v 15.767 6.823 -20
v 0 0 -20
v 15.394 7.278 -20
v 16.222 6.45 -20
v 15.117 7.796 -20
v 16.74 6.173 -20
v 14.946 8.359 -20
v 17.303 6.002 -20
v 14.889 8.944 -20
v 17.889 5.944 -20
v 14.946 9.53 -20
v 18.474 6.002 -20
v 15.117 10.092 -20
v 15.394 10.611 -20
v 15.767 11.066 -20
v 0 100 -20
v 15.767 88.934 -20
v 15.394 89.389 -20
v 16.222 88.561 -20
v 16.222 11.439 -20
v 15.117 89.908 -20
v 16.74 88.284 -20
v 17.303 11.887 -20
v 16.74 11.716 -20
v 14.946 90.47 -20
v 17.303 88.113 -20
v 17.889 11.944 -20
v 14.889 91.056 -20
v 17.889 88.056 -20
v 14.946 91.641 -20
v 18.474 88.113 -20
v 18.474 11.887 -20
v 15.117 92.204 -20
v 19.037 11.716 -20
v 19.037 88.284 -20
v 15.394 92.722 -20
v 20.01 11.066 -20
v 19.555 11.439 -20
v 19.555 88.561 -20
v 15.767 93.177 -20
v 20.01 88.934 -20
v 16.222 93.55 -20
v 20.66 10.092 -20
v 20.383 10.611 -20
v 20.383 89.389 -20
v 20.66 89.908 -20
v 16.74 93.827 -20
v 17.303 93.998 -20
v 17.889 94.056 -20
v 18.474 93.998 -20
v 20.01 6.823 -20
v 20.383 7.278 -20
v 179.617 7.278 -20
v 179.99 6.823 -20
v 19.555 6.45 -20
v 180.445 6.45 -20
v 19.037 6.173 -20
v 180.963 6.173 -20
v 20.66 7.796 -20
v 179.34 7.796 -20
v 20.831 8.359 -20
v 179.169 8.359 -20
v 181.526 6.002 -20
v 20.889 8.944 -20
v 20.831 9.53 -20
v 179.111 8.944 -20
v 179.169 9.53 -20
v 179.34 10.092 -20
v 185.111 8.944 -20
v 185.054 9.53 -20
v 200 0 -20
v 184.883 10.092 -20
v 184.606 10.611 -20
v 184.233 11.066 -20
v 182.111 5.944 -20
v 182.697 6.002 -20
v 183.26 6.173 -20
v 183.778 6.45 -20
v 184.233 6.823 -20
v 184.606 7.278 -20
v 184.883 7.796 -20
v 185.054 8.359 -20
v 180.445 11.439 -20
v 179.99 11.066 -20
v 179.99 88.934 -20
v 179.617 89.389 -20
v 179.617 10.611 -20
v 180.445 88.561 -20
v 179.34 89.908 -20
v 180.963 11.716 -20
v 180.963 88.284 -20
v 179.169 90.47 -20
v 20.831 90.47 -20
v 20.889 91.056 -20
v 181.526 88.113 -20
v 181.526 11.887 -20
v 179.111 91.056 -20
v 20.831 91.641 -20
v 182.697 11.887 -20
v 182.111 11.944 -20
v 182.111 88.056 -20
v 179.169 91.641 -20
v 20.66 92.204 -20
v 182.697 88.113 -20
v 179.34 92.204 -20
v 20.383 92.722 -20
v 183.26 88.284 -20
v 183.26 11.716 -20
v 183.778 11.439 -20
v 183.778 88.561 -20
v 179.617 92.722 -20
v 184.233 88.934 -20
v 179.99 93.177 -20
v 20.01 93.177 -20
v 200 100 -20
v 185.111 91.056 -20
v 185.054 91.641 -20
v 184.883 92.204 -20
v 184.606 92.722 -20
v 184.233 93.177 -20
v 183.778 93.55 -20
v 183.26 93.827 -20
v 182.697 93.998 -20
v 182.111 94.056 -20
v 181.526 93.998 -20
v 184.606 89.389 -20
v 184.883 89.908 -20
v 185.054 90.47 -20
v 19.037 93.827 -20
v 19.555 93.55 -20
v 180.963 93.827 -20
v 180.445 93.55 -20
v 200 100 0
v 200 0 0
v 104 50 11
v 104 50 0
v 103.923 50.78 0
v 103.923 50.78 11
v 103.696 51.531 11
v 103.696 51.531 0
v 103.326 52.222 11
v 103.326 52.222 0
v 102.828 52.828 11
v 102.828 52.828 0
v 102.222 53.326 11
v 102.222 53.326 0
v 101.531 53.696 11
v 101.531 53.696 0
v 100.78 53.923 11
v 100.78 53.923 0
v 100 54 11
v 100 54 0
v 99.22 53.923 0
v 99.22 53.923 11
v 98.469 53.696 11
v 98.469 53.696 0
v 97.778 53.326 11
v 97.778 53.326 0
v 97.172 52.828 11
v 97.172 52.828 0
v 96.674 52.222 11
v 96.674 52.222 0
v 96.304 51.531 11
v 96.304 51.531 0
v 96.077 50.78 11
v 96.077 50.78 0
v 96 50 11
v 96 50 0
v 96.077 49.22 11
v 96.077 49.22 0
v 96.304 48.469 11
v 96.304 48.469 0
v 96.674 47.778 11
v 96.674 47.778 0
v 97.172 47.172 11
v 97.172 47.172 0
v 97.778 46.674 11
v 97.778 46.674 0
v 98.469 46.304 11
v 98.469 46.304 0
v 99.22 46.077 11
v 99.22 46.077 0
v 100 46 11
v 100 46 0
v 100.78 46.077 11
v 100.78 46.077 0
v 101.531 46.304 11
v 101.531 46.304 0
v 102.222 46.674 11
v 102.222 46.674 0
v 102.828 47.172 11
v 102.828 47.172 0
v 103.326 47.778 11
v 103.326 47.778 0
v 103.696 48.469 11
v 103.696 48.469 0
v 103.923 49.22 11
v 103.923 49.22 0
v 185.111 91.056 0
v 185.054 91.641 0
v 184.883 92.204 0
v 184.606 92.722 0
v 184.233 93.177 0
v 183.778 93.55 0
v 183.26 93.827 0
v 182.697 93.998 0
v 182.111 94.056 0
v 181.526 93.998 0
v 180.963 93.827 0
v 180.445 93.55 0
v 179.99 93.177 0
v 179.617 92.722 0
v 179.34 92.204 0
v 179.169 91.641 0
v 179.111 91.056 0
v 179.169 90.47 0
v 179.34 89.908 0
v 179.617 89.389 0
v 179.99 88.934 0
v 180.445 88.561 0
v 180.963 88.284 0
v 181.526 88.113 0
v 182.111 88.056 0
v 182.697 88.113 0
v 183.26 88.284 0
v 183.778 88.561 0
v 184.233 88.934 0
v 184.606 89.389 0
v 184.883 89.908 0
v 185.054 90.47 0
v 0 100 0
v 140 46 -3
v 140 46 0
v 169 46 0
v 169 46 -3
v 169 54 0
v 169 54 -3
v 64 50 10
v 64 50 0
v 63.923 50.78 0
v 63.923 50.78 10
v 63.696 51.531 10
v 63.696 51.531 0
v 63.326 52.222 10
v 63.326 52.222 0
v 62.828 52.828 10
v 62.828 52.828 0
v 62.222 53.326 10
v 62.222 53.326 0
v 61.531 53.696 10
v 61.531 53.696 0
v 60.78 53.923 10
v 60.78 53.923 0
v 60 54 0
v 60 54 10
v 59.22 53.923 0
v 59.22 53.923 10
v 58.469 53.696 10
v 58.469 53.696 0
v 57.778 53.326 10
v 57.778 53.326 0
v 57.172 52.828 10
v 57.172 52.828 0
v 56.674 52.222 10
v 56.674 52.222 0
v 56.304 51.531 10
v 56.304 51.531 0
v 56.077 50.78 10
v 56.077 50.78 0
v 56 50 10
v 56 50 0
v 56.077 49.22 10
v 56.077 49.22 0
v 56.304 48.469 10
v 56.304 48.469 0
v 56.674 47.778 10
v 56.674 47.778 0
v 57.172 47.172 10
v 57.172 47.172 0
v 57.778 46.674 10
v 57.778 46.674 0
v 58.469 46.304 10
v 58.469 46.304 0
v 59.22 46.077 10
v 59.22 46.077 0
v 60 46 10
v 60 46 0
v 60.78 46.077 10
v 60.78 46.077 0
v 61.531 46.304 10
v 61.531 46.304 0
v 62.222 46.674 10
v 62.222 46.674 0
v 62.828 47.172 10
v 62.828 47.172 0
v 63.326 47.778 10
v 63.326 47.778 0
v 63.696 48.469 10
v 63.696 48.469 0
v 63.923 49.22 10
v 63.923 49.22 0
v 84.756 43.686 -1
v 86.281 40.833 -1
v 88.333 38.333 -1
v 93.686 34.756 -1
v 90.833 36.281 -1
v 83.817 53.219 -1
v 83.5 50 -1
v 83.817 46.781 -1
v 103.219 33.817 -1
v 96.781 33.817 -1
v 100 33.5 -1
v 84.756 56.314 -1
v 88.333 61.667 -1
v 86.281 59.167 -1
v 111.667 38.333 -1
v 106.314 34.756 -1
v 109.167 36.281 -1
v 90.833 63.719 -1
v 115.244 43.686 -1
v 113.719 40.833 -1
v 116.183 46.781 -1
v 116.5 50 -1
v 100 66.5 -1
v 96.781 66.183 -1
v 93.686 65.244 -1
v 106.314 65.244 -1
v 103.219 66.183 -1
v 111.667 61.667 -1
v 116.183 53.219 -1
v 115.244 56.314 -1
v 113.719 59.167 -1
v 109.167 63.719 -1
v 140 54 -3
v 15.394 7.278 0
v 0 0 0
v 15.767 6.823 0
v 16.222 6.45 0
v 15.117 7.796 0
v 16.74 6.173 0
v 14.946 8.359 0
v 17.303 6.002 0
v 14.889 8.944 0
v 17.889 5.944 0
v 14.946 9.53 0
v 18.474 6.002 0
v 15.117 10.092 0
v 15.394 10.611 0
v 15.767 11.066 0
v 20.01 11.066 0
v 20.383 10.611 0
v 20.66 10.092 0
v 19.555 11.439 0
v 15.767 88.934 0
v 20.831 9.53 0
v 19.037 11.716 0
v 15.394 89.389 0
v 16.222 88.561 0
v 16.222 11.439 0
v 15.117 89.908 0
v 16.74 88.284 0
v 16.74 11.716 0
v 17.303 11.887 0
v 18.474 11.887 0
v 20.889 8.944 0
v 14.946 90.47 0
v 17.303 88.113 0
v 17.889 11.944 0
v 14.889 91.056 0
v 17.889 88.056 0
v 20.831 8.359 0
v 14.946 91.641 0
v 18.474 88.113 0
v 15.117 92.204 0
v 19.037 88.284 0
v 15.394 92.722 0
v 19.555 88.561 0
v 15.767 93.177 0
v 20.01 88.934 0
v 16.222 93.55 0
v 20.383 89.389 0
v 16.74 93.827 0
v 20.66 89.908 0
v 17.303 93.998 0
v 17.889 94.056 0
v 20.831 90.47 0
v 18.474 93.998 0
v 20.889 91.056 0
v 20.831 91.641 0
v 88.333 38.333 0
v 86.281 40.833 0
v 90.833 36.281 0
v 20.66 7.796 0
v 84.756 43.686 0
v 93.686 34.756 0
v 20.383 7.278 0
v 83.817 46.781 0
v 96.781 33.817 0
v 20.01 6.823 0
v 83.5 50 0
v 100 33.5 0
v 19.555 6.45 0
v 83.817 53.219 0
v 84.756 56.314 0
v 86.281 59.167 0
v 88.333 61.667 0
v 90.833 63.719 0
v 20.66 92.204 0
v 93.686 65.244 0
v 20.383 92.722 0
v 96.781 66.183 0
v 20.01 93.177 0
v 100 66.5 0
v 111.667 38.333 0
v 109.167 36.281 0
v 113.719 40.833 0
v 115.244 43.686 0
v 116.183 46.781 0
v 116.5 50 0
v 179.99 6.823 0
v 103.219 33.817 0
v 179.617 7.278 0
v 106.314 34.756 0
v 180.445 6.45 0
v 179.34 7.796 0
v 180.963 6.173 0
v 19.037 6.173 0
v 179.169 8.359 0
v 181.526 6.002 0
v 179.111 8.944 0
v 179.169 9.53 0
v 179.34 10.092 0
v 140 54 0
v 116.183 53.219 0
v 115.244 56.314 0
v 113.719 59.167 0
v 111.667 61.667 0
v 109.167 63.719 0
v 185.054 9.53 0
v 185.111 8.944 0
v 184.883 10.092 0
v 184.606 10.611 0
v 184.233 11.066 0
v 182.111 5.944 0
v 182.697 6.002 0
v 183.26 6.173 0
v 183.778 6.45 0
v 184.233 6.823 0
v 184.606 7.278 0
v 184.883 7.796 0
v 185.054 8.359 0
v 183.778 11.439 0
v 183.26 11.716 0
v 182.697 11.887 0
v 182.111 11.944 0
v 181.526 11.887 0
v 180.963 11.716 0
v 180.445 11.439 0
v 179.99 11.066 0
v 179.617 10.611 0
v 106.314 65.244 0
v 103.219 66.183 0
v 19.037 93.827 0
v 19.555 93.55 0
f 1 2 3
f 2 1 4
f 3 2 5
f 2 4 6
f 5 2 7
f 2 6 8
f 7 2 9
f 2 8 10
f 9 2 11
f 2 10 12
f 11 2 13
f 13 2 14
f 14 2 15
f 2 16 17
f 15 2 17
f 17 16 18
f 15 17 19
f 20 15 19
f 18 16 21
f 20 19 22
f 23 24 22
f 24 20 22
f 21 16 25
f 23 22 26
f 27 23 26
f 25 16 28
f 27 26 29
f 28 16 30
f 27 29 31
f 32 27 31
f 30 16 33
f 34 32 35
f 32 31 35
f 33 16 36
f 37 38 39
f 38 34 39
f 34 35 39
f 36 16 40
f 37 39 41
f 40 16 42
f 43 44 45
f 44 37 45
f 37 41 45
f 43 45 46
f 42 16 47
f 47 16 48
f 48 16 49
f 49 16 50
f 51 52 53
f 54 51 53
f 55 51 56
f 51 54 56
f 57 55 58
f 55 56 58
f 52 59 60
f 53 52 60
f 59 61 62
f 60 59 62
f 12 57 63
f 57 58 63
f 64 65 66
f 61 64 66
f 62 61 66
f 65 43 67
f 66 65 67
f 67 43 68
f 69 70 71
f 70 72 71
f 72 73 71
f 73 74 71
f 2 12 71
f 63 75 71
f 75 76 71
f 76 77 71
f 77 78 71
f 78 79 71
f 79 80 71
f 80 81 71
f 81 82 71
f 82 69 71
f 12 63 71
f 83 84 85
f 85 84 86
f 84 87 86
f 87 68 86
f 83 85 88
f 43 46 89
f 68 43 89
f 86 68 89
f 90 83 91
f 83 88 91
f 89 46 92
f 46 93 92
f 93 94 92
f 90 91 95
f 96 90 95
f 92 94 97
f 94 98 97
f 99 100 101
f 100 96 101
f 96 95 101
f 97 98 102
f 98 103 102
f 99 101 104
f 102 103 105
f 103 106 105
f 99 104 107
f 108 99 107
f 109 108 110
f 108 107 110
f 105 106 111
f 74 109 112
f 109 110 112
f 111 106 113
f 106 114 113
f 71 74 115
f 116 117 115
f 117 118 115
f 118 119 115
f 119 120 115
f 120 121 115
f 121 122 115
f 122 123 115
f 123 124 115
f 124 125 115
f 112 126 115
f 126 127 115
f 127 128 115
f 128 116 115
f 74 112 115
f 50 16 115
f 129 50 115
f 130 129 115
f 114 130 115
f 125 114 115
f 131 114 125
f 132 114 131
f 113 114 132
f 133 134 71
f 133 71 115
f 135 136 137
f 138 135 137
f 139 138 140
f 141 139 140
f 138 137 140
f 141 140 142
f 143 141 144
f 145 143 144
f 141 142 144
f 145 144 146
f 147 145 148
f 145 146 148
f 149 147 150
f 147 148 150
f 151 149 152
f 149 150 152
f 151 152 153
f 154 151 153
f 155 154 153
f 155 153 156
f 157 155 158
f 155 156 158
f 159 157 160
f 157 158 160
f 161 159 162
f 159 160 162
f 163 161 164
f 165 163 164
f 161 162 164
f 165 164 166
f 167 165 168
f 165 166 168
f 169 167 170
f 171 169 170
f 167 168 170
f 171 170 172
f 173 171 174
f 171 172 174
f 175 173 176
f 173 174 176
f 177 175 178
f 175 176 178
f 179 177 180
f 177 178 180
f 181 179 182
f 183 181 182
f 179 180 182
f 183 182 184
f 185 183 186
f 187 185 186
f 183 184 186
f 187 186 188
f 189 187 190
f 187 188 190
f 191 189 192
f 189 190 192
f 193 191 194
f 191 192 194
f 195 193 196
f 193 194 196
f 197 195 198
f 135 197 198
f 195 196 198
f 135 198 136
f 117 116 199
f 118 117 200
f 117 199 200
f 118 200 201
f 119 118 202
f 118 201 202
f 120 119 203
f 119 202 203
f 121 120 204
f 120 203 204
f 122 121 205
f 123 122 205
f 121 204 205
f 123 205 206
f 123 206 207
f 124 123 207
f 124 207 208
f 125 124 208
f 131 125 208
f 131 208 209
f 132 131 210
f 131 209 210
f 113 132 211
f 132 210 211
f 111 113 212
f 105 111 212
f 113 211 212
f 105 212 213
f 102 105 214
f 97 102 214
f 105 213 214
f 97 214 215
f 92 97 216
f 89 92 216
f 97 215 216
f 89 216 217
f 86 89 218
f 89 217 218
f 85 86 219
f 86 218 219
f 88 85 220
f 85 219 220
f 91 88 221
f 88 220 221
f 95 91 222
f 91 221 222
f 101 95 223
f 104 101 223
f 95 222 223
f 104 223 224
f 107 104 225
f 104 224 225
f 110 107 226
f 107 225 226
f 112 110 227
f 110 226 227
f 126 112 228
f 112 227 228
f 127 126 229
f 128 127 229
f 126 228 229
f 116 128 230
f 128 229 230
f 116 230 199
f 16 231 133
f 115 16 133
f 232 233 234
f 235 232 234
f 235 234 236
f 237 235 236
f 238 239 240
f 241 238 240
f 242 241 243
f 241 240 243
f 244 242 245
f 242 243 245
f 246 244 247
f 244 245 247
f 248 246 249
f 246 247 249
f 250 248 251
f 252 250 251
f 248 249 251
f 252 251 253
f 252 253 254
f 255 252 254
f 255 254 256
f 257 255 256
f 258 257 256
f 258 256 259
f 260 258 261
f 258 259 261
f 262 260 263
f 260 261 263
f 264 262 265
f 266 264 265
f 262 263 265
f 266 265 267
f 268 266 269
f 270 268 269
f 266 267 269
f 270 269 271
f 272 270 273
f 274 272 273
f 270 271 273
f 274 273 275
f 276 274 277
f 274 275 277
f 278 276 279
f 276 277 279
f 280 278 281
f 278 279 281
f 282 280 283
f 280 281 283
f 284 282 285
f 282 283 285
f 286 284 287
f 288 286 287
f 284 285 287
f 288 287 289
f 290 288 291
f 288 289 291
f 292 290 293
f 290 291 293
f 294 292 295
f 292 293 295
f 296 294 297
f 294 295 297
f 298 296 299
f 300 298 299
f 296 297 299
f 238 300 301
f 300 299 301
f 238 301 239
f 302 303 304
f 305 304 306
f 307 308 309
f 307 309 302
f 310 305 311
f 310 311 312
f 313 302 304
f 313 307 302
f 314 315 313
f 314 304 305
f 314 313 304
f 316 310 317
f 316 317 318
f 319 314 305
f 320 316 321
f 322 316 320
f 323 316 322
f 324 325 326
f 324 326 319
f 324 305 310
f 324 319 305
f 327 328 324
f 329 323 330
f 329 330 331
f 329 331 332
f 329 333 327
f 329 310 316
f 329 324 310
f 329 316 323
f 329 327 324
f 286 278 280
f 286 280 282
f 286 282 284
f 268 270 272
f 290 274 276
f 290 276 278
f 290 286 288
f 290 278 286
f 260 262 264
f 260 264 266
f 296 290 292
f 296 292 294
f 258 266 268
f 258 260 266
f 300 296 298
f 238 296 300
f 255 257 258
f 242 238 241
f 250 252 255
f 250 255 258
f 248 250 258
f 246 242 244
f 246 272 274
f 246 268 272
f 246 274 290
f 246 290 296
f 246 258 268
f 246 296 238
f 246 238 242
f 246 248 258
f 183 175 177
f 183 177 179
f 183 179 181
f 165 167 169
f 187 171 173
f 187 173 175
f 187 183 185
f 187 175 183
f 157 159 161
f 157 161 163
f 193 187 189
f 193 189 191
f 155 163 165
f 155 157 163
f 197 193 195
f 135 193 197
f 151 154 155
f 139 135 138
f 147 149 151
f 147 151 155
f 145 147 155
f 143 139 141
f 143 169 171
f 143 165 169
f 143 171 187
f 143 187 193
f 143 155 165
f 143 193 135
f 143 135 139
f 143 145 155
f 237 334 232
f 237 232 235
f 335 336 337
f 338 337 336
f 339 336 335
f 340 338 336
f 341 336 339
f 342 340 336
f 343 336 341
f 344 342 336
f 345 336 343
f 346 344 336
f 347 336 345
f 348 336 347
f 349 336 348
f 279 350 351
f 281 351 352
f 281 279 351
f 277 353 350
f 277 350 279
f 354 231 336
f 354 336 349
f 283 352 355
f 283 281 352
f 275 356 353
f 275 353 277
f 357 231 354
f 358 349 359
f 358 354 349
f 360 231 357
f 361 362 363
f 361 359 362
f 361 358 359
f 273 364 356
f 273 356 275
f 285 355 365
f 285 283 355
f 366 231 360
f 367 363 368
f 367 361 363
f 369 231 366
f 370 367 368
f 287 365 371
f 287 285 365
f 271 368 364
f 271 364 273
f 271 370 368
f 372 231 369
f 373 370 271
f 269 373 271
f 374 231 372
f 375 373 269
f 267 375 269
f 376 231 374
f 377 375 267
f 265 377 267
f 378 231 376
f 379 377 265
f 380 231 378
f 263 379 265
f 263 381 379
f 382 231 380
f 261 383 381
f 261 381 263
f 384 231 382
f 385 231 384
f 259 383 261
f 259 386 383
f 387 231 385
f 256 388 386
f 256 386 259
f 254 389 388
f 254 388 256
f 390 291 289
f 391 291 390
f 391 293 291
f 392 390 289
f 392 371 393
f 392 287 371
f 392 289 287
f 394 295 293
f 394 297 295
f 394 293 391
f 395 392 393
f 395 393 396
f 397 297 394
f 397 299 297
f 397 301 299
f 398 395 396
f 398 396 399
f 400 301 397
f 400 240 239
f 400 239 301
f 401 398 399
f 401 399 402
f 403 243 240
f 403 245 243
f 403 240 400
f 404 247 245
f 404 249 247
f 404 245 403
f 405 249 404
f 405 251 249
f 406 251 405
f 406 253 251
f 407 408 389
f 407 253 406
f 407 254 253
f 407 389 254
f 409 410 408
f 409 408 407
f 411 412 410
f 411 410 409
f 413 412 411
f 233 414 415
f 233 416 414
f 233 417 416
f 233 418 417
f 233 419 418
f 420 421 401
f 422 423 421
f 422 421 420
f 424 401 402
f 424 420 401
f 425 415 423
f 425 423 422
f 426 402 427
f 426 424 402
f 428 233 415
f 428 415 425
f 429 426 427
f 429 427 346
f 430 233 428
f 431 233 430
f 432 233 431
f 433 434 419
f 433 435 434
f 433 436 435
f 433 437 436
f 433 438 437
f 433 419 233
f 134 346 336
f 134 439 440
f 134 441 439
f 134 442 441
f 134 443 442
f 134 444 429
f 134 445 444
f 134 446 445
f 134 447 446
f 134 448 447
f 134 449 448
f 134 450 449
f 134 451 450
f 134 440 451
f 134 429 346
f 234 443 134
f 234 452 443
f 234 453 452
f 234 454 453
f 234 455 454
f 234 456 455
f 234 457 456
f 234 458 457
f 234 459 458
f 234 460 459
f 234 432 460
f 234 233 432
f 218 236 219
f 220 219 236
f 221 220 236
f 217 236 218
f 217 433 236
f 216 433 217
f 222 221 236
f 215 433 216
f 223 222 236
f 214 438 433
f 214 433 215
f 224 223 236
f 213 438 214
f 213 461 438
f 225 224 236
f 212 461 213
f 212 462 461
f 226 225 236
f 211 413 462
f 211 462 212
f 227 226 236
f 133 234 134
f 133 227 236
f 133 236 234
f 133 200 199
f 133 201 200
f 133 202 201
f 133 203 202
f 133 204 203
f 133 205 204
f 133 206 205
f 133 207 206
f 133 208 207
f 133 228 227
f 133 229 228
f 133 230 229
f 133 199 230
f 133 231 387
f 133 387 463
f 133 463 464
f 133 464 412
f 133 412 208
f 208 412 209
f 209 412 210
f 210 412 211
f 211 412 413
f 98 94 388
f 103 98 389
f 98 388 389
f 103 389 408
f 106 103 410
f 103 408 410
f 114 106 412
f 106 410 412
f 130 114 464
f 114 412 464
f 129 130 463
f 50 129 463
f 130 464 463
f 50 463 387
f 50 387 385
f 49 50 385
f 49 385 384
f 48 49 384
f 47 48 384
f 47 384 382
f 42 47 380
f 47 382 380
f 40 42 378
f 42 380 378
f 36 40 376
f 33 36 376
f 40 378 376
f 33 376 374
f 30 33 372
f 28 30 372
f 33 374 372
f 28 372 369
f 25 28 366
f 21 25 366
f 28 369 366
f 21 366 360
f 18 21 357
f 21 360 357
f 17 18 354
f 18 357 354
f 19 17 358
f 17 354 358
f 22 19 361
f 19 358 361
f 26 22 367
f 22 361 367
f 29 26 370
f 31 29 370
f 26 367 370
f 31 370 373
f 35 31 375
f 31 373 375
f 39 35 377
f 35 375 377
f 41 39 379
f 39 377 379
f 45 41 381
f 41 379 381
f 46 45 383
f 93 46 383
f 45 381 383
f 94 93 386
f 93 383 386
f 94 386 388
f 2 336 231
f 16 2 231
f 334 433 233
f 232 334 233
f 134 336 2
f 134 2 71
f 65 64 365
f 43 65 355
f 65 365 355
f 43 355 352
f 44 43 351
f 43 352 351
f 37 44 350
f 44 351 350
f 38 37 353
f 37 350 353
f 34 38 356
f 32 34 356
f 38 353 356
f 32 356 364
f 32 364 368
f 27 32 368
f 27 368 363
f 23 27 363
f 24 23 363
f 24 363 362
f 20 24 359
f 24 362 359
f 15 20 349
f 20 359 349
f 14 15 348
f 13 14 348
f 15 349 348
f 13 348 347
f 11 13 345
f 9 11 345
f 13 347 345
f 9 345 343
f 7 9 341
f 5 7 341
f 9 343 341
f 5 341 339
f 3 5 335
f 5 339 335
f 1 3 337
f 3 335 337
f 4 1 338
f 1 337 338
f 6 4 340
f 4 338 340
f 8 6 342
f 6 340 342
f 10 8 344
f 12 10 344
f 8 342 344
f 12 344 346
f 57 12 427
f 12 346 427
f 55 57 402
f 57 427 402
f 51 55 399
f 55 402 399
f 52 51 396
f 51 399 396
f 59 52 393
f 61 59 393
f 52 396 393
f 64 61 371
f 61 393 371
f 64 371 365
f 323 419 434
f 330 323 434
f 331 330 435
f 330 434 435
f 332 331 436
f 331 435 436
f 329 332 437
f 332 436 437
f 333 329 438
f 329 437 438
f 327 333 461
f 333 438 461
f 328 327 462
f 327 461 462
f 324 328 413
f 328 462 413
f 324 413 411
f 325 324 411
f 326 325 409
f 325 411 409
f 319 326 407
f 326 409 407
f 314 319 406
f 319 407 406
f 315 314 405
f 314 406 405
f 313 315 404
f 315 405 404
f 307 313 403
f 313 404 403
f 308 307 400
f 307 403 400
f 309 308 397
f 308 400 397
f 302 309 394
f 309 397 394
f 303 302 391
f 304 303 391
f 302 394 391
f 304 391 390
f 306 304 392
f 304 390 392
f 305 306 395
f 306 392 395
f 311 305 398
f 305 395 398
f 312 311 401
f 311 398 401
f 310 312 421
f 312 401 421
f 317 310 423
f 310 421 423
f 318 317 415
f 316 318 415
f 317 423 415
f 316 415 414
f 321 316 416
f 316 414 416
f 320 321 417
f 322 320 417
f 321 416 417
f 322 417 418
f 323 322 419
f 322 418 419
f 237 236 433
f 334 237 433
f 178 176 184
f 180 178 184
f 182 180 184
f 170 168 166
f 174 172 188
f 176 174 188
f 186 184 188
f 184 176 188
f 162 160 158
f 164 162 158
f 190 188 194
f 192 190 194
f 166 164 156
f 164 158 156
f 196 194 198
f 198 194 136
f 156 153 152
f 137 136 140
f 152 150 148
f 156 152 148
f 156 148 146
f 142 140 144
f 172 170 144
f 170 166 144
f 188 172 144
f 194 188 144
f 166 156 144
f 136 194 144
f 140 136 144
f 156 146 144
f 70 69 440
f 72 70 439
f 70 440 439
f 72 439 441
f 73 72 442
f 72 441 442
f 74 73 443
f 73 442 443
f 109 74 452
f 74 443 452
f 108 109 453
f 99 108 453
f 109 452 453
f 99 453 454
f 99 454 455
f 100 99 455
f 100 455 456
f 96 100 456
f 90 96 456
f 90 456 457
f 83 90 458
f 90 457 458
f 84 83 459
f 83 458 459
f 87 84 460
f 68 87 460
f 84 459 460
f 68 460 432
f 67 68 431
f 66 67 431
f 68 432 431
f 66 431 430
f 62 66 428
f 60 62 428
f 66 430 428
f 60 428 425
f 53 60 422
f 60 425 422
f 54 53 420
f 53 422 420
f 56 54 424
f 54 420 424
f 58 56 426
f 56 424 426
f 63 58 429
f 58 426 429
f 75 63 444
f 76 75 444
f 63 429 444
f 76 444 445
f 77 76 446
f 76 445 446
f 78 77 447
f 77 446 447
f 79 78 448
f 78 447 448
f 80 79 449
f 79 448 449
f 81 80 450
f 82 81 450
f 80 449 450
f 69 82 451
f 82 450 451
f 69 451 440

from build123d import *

# Parameters (mm, degrees)
SKETCH_1_W          = 200
SKETCH_1_H          = 100
EXTRUDE_1_DEPTH     = 20
SKETCH_2_R          = 16.5
CUT_EXTRUDE_1_DEPTH = 1
CUT_EXTRUDE_2_DEPTH = 3
SKETCH_4_R          = 3
CUT_EXTRUDE_4_DEPTH = 20
SKETCH_5_R          = 3
CUT_EXTRUDE_5_DEPTH = 20
SKETCH_6_R          = 4
EXTRUDE_3_DEPTH     = 11
SKETCH_7_R          = 4
EXTRUDE_4_DEPTH     = 10


with BuildPart() as part:
    # 草图1 → 凸台-拉伸1 (new body)
    with BuildSketch(Plane.XY):
        with Locations((100, 50)):
            Rectangle(SKETCH_1_W, SKETCH_1_H)
    extrude(amount=-EXTRUDE_1_DEPTH)

    # 草图2 → 切除-拉伸1 (cut)
    with BuildSketch(Plane.XY):
        with Locations((100, 50)):
            Circle(SKETCH_2_R)
    extrude(amount=-CUT_EXTRUDE_1_DEPTH, mode=Mode.SUBTRACT)

    # 草图3 → 切除-拉伸2 (cut)
    with BuildSketch(Plane.XY):
        Polygon((140, 54), (140, 50), (140, 46), (169, 46), (169, 54), align=None)
    extrude(amount=-CUT_EXTRUDE_2_DEPTH, mode=Mode.SUBTRACT)

    # 草图4 → 切除-拉伸4 (cut)
    with BuildSketch(Plane.XY):
        with Locations((17.88854382, 91.05572809)):
            Circle(SKETCH_4_R)
        with Locations((182.11145618, 91.05572809)):
            Circle(SKETCH_4_R)
    extrude(amount=-CUT_EXTRUDE_4_DEPTH, mode=Mode.SUBTRACT)

    # 草图5 → 切除-拉伸5 (cut)
    with BuildSketch(Plane.XY):
        with Locations((17.88854382, 8.94427191)):
            Circle(SKETCH_5_R)
        with Locations((182.11145618, 8.94427191)):
            Circle(SKETCH_5_R)
    extrude(amount=-CUT_EXTRUDE_5_DEPTH, mode=Mode.SUBTRACT)

    # 草图7 → 凸台-拉伸4 (add)
    with BuildSketch(Plane.XY):
        with Locations((60, 50)):
            Circle(SKETCH_7_R)
    extrude(amount=EXTRUDE_4_DEPTH)


with BuildPart() as body_2:
    # 草图6 → 凸台-拉伸3 (new body)
    with BuildSketch(Plane.XY):
        with Locations((100, 50)):
            Circle(SKETCH_6_R)
    extrude(amount=EXTRUDE_3_DEPTH)


solid = Compound([part.part, body_2.part])
